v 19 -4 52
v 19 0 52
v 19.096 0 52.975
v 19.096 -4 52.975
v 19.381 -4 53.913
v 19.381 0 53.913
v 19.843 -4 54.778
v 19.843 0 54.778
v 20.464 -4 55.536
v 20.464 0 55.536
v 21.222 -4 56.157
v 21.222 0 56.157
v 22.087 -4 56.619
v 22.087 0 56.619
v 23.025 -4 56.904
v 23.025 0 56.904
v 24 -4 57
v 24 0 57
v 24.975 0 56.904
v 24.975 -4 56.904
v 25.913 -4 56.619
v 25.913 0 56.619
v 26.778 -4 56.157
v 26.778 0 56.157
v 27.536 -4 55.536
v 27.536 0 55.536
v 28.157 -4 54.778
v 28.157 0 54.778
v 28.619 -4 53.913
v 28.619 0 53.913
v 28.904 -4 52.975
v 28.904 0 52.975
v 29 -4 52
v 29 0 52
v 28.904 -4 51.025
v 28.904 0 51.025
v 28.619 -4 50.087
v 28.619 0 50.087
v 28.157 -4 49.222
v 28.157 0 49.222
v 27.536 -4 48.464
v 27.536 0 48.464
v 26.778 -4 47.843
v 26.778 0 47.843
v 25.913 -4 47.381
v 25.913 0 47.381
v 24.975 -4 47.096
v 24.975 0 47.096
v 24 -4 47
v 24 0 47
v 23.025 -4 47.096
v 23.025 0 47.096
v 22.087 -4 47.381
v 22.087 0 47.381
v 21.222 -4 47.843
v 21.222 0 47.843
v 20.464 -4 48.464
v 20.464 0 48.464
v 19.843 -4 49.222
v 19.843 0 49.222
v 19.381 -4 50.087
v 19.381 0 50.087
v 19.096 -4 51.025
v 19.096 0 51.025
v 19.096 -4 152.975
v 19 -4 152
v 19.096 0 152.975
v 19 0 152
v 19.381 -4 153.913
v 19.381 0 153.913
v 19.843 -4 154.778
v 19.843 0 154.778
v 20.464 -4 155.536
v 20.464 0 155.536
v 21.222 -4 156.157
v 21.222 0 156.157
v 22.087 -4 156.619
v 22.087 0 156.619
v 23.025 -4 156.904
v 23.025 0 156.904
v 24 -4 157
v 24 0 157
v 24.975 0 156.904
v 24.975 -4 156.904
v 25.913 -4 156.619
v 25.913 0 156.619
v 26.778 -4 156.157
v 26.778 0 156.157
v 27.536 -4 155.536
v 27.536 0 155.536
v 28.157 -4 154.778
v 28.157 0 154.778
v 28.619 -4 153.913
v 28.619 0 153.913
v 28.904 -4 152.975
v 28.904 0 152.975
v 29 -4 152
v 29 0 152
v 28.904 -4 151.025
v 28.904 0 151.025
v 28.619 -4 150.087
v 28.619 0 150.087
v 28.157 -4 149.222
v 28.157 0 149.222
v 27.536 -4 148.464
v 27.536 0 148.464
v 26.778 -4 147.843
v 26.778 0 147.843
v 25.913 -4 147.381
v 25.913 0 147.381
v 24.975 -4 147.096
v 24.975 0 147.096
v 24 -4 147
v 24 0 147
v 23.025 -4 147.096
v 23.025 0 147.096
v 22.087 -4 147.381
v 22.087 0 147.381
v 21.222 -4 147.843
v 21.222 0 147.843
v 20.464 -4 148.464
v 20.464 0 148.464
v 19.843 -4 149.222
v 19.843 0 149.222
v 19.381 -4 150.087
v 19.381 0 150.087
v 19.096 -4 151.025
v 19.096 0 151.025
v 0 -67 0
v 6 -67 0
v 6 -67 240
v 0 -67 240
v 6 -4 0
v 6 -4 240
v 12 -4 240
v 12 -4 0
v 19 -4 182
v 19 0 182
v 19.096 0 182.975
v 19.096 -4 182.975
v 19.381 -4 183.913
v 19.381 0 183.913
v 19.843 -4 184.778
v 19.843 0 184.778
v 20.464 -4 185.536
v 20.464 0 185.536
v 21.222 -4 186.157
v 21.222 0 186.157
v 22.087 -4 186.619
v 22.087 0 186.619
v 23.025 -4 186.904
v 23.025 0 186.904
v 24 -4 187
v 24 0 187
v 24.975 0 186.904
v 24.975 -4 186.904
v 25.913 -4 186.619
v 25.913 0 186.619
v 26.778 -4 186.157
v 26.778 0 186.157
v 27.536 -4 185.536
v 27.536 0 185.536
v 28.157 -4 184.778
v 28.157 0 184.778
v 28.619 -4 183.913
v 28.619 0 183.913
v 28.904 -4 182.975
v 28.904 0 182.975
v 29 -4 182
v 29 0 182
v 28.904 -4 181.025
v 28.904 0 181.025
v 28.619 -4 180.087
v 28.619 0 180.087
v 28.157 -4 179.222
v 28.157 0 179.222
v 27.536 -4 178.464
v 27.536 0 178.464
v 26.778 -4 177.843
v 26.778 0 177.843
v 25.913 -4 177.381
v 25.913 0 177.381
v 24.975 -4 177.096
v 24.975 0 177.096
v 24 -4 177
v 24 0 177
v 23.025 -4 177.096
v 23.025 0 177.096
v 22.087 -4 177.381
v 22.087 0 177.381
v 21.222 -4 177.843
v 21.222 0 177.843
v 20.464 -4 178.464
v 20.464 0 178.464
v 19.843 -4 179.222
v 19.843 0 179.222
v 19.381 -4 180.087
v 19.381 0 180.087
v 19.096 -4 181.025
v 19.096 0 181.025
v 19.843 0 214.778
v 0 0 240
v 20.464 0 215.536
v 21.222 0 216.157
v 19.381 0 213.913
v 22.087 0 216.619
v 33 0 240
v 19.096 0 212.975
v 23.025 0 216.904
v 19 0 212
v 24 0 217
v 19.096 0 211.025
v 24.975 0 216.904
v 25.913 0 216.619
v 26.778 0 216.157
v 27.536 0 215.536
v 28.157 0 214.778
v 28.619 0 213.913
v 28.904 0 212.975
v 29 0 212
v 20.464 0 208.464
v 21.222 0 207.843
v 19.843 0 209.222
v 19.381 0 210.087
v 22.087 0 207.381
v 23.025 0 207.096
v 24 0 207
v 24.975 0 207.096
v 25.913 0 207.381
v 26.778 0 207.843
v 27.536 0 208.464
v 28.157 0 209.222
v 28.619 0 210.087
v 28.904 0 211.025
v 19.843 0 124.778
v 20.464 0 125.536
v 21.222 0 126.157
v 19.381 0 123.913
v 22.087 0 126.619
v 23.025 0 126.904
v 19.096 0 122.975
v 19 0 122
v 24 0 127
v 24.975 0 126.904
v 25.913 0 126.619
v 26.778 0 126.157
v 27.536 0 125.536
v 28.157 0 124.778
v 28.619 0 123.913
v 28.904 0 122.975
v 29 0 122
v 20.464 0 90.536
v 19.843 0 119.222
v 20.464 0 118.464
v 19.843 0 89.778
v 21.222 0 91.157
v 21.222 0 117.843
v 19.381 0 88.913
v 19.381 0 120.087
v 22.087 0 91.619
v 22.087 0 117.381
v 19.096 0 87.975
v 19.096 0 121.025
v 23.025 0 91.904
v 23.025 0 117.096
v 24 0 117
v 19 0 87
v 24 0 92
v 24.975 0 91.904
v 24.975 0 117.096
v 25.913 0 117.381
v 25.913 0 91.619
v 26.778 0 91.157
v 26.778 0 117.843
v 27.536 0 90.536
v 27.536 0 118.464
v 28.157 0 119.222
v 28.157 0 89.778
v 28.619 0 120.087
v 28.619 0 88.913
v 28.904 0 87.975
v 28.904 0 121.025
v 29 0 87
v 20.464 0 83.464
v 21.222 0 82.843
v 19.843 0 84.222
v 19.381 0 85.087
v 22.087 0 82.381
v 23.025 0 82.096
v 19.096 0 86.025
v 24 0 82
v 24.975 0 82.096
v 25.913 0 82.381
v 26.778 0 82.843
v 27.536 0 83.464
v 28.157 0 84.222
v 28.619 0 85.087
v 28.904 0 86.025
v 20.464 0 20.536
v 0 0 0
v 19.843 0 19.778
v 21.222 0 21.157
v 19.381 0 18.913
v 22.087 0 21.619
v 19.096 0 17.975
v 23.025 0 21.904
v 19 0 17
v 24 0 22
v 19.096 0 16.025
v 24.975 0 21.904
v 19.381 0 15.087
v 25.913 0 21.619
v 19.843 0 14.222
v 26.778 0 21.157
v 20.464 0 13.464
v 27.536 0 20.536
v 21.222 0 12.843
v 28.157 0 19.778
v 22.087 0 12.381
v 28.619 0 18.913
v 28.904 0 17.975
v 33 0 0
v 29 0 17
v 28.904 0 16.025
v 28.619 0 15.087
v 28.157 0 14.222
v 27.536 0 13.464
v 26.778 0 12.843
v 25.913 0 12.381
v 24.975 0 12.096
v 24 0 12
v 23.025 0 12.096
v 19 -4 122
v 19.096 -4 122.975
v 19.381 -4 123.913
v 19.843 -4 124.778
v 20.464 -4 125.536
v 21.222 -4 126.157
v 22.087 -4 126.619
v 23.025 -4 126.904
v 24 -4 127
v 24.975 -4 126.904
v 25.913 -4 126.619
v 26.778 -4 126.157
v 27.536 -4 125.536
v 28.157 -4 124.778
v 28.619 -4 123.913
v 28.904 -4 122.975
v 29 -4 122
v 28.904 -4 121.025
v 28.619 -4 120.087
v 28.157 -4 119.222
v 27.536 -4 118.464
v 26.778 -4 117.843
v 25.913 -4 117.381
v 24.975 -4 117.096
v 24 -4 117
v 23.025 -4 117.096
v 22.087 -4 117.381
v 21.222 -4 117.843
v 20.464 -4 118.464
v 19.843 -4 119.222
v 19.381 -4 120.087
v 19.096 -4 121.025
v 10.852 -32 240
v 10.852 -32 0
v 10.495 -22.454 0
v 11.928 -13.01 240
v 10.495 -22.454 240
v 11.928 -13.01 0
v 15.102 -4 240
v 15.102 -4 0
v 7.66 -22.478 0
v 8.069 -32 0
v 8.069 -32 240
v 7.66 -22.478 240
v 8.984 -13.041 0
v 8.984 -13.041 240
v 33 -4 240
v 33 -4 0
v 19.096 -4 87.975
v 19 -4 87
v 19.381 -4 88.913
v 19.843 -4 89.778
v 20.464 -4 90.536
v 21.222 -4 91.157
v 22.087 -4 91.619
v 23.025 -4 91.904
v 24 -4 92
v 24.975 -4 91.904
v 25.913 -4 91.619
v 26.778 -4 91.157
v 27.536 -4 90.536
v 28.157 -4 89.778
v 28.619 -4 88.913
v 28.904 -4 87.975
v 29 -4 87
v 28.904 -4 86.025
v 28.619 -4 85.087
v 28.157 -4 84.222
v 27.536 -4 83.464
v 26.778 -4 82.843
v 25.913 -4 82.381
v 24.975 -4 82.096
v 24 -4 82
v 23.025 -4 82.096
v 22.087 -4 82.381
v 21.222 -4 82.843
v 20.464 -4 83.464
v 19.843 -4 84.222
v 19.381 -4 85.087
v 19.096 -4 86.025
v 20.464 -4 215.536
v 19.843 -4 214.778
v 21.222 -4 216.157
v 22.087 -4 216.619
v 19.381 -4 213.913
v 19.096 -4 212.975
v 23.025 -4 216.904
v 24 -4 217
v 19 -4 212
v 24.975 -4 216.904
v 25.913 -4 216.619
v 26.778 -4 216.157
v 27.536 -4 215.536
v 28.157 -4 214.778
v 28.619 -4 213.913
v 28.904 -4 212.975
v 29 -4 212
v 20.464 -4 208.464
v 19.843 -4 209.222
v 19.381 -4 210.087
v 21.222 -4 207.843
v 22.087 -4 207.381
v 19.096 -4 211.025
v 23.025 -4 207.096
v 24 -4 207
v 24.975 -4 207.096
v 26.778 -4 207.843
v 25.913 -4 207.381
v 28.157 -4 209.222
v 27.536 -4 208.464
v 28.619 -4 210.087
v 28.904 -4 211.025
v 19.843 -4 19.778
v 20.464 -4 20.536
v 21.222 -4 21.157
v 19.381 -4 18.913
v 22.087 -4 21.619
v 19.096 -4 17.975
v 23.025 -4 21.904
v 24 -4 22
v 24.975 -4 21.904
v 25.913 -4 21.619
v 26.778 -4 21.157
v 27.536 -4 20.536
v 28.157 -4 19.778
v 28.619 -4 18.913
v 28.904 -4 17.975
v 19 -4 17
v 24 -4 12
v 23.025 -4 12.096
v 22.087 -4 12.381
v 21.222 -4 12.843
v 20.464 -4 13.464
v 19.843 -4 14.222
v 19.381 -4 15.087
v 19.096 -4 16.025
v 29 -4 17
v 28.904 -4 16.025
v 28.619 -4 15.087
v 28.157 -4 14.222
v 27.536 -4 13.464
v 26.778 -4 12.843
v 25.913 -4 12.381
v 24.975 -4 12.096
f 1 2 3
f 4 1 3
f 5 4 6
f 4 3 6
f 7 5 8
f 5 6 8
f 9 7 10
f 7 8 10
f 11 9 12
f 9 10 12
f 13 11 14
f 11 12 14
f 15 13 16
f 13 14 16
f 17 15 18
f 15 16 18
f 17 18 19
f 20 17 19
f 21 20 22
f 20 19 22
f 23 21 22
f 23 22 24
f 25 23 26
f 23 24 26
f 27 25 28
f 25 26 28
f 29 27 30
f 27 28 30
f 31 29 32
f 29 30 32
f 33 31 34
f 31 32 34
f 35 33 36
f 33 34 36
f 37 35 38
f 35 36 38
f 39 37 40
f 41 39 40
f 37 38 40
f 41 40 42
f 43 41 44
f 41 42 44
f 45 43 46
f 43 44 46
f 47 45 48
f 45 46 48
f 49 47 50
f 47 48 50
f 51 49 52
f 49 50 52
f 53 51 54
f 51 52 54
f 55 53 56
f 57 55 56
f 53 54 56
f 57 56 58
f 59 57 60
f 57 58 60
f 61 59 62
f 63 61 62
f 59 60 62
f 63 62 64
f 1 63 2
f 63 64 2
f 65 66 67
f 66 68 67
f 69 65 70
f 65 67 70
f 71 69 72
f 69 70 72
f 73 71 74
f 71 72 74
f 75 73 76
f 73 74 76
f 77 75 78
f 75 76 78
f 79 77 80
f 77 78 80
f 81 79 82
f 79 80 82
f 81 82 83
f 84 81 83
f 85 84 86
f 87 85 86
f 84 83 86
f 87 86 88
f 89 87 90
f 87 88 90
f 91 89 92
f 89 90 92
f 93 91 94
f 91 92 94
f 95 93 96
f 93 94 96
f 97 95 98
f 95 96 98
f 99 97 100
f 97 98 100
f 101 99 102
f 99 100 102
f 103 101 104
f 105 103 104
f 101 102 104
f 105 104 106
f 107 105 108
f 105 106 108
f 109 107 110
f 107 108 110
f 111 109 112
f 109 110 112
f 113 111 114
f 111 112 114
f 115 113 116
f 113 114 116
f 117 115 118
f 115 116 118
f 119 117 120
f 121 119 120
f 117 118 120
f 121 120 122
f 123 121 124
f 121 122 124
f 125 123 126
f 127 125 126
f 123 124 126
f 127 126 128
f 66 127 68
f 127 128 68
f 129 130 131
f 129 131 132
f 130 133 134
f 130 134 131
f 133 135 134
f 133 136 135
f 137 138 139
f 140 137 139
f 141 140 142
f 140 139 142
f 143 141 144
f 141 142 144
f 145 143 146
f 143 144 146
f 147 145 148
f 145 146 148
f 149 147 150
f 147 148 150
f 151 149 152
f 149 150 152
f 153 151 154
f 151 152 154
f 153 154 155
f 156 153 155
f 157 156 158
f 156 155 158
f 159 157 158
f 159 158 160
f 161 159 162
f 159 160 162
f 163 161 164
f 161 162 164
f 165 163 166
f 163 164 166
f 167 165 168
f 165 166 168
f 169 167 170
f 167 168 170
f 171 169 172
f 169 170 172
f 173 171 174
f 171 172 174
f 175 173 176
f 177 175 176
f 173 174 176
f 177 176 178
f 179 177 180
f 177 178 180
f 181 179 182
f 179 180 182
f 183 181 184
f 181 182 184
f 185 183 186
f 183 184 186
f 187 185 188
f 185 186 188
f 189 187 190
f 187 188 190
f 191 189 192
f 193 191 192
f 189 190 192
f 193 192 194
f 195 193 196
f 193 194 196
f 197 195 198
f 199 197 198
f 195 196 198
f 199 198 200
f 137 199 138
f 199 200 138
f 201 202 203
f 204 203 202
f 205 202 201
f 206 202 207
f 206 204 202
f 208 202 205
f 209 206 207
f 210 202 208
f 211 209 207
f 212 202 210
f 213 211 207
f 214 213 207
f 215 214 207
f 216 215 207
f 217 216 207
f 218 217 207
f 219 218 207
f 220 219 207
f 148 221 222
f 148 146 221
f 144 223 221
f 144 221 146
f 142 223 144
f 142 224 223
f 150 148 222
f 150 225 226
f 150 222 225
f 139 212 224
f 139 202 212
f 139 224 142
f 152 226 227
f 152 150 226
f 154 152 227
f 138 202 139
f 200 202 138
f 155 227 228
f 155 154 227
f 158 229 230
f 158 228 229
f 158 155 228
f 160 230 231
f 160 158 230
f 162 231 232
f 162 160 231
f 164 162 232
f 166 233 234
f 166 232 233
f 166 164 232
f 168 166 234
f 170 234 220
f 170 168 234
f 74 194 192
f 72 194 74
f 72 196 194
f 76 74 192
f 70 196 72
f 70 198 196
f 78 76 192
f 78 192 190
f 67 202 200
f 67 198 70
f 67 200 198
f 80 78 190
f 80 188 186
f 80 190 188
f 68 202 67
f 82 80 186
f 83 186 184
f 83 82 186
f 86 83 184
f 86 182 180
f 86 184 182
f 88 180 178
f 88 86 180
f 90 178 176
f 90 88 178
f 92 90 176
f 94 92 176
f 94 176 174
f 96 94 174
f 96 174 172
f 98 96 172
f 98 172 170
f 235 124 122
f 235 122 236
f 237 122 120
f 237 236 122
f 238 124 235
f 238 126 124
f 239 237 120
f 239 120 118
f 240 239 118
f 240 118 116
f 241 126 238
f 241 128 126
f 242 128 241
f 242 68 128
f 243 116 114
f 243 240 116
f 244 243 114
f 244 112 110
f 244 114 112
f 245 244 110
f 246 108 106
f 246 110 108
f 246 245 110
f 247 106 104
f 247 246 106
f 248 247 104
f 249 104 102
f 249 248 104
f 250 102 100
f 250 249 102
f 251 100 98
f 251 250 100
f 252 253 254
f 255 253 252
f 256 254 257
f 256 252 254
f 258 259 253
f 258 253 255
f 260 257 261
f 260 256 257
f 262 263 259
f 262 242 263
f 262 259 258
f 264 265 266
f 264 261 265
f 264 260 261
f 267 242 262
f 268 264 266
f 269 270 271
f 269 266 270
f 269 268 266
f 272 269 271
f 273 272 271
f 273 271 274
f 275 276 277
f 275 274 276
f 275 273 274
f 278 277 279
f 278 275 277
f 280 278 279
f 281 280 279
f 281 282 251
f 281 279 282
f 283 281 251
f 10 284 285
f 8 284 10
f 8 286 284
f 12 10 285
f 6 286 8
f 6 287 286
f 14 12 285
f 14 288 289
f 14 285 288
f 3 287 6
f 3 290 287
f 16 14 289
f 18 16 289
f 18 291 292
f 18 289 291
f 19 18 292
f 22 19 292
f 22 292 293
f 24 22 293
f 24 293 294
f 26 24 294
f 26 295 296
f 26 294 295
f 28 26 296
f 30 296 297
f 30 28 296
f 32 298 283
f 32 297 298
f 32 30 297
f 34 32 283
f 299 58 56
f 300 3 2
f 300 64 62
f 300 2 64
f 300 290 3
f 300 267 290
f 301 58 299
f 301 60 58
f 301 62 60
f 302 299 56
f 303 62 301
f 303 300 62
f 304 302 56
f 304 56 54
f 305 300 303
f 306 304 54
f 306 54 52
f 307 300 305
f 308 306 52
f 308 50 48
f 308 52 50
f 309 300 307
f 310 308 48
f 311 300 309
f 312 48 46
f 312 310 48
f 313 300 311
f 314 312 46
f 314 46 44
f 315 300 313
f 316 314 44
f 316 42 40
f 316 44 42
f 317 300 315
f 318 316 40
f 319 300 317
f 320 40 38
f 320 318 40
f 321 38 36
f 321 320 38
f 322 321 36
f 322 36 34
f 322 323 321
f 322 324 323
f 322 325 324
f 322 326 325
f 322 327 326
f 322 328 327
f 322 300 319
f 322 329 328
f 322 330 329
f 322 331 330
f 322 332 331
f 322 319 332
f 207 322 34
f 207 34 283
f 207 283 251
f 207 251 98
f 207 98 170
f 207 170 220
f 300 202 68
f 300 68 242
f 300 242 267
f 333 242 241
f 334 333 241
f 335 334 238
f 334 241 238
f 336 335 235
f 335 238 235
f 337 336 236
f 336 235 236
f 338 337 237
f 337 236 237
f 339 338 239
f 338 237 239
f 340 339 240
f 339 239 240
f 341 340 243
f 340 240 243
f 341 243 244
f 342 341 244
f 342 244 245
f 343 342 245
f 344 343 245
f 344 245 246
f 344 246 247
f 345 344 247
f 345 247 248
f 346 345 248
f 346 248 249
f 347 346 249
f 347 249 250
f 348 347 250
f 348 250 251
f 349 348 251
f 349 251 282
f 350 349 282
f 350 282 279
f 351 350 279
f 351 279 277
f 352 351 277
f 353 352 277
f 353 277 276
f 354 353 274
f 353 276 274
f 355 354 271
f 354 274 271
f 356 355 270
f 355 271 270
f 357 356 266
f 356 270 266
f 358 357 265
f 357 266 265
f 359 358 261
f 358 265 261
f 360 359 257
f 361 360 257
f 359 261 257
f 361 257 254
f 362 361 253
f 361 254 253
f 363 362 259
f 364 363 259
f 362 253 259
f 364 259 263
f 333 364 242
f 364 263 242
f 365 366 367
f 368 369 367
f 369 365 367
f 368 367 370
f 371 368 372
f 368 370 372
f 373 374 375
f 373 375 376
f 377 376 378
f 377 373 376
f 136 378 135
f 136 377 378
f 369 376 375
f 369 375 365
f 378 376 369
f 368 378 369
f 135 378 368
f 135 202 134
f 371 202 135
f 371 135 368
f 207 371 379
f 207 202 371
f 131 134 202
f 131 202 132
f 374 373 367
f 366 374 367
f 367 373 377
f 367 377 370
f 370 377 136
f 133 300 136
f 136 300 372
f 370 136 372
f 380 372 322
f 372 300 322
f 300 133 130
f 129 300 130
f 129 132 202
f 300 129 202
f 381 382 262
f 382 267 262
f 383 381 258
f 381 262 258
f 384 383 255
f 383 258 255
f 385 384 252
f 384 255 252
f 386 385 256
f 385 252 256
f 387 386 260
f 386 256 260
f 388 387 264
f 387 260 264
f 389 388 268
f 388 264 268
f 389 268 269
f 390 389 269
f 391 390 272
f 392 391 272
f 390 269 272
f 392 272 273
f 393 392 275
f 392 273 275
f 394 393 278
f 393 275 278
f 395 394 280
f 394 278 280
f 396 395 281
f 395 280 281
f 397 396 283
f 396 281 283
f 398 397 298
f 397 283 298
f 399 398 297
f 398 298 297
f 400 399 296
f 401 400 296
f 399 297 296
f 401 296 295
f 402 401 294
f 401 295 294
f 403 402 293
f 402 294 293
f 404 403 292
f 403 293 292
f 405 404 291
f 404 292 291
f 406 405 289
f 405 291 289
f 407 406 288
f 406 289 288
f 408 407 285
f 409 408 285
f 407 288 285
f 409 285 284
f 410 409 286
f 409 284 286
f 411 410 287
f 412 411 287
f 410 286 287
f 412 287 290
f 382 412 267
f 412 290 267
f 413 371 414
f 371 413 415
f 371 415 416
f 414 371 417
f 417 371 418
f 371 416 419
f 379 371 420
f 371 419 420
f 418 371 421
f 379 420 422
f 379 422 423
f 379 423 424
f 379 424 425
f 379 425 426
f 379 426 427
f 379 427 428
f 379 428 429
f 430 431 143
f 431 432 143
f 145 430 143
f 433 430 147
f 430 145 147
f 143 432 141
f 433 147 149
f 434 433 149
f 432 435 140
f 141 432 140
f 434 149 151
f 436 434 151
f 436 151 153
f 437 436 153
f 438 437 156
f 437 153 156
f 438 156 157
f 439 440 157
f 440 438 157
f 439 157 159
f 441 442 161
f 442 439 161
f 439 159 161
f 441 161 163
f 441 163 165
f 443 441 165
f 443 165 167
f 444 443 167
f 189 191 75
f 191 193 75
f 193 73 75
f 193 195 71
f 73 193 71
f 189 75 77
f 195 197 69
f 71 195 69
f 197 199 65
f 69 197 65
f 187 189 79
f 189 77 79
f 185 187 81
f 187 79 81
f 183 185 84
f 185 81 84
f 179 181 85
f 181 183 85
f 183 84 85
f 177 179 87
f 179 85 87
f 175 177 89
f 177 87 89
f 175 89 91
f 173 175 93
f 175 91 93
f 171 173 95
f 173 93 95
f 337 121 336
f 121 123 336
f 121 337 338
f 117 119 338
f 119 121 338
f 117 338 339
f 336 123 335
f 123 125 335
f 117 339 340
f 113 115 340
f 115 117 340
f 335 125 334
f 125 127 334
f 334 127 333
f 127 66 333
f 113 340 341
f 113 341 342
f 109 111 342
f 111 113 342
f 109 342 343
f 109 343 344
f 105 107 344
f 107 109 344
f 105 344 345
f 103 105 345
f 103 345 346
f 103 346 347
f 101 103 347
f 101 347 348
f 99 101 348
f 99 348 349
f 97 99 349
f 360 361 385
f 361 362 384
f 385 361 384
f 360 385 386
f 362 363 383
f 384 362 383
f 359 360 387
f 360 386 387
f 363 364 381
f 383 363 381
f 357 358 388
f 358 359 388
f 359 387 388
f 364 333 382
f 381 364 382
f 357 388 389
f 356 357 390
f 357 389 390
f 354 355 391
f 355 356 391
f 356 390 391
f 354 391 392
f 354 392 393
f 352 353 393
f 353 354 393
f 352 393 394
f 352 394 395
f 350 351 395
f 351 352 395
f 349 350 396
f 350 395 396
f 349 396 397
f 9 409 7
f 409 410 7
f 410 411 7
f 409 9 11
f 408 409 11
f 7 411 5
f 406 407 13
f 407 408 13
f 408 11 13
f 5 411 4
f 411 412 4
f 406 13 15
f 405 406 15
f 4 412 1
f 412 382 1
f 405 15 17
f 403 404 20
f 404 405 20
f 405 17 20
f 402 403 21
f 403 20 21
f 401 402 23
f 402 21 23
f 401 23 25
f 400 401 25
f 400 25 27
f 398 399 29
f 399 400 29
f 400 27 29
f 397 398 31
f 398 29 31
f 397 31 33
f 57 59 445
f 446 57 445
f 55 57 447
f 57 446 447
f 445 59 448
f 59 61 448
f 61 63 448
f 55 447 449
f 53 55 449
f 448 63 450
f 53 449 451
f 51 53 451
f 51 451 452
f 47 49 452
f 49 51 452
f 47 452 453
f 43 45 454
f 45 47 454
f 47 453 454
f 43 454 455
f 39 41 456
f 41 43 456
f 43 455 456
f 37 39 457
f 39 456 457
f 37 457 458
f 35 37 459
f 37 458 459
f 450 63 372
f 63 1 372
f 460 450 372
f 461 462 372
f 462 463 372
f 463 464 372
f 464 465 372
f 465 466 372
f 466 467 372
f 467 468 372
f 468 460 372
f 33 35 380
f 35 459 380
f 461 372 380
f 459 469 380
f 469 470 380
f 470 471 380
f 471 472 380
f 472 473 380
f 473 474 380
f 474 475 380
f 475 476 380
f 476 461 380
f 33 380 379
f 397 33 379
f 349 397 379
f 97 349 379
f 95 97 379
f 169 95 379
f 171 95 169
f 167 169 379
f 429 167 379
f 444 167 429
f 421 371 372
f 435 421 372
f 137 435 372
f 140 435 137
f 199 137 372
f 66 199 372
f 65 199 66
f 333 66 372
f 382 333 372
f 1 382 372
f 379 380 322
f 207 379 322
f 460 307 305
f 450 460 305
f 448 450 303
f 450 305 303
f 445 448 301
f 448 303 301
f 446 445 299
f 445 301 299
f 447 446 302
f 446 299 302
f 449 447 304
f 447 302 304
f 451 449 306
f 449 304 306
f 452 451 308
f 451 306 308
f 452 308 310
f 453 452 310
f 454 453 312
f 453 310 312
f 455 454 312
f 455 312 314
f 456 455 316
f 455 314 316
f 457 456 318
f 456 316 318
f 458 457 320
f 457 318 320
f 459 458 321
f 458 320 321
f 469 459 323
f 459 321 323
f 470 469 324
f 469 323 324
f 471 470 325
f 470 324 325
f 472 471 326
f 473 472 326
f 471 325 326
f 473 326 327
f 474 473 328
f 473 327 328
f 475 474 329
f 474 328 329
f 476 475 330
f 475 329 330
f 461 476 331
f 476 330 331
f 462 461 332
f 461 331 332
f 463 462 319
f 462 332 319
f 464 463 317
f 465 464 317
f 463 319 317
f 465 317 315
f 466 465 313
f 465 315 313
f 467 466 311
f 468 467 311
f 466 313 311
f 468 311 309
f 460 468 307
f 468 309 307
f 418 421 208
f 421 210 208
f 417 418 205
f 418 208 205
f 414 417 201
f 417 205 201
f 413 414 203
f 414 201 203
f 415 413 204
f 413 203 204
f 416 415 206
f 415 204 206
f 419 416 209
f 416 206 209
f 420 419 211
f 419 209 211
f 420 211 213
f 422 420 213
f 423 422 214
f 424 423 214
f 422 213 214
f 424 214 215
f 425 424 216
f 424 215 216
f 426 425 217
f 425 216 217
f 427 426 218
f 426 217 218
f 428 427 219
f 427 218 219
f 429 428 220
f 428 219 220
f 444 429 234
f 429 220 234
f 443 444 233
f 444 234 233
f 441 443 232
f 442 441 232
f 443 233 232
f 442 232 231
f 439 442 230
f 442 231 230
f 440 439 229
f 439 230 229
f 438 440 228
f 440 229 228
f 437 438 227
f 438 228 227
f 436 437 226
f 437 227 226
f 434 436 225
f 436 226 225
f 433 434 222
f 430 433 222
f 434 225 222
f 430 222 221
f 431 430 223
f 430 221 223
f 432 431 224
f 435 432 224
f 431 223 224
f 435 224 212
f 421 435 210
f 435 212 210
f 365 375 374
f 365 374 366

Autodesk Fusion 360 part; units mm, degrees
sketch "Sketch1" plane through (0, 0, 0) normal (0, 0, 1) x (1, 0, 0) in component "Component"
  line L0 (0, 0) -> (6, 0)
  line L1 (6, 0) -> (6, -67)
  line L2 (6, -67) -> (0, -67)
  line L3 (0, -67) -> (0, 0)
  line L4 (6, 0) -> (18, 0)
  line L5 (18, 0) -> (18, -4)
  line L6 (18, -4) -> (6, -4)
  line L7 (6, -4) -> (6, 0)
  line L8 (8.0693, -4) -> (8.0693, -32) construction
  arc A0 (12, -4) -> (8.0693, -32) centre (59.8982, -25) ccw
  arc A1 (15.1021, -4) -> (10.8522, -32) centre (61.2859, -25.3325) ccw
  line L9 (8.0693, -32) -> (10.8522, -32)
  dimension "d1" = 6
  dimension "d2" = 67
  dimension "d3" = 12
  dimension "d4" = 4
  dimension "d5" = 28
extrude "Extrude1" add sketch "Sketch1" along normal blind 240 in component "Component"
sketch "Sketch2" plane through (0, 0, 0) normal (0, 1, 0) x (-1, 0, 0) in component "Component"
  line L0 (-18, 0) -> (0, 0)
  line L1 (0, 0) -> (0, 240)
  line L2 (0, 240) -> (-18, 240)
  line L3 (-18, 240) -> (-18, 0)
  circle A0 centre (-24, 17) radius 5
  line L4 (-9, 47) -> (-24, 52) construction
  circle A1 centre (-24, 52) radius 5
  circle A2 centre (-24, 87) radius 5
  circle A3 centre (-24, 122) radius 5
  circle A4 centre (-24, 152) radius 5
  circle A5 centre (-24, 182) radius 5
  circle A6 centre (-24, 212) radius 5
  dimension "d10" = 10
  dimension "d12" = 10
  dimension "d14" = 10
  dimension "d16" = 10
  dimension "d18" = 10
  dimension "d20" = 10
  dimension "d22" = 10
sketch "Sketch3" plane through (0, 0, 0) normal (0, 0, 1) x (1, 0, 0) in component "Component"
  line L0 (18, 0) -> (33, 0)
  line L1 (18, -4) -> (33, -4)
  line L2 (33, -4) -> (33, 0)
  line L3 (18, 0) -> (18, -4)
  dimension "d23" = 15
extrude "Extrude2" add sketch "Sketch3" along normal blind 240 in component "Component"
extrude "Extrude3" cut sketch "Sketch2" against normal blind 20 contours A0 | A1 | A2 | A3 | A4 | A5 | A6 in component "Component"
component "Component" placed x (1, 0, 0) y (0, 1, 0) z (0, 0, 1) at (0, 0, 0)
